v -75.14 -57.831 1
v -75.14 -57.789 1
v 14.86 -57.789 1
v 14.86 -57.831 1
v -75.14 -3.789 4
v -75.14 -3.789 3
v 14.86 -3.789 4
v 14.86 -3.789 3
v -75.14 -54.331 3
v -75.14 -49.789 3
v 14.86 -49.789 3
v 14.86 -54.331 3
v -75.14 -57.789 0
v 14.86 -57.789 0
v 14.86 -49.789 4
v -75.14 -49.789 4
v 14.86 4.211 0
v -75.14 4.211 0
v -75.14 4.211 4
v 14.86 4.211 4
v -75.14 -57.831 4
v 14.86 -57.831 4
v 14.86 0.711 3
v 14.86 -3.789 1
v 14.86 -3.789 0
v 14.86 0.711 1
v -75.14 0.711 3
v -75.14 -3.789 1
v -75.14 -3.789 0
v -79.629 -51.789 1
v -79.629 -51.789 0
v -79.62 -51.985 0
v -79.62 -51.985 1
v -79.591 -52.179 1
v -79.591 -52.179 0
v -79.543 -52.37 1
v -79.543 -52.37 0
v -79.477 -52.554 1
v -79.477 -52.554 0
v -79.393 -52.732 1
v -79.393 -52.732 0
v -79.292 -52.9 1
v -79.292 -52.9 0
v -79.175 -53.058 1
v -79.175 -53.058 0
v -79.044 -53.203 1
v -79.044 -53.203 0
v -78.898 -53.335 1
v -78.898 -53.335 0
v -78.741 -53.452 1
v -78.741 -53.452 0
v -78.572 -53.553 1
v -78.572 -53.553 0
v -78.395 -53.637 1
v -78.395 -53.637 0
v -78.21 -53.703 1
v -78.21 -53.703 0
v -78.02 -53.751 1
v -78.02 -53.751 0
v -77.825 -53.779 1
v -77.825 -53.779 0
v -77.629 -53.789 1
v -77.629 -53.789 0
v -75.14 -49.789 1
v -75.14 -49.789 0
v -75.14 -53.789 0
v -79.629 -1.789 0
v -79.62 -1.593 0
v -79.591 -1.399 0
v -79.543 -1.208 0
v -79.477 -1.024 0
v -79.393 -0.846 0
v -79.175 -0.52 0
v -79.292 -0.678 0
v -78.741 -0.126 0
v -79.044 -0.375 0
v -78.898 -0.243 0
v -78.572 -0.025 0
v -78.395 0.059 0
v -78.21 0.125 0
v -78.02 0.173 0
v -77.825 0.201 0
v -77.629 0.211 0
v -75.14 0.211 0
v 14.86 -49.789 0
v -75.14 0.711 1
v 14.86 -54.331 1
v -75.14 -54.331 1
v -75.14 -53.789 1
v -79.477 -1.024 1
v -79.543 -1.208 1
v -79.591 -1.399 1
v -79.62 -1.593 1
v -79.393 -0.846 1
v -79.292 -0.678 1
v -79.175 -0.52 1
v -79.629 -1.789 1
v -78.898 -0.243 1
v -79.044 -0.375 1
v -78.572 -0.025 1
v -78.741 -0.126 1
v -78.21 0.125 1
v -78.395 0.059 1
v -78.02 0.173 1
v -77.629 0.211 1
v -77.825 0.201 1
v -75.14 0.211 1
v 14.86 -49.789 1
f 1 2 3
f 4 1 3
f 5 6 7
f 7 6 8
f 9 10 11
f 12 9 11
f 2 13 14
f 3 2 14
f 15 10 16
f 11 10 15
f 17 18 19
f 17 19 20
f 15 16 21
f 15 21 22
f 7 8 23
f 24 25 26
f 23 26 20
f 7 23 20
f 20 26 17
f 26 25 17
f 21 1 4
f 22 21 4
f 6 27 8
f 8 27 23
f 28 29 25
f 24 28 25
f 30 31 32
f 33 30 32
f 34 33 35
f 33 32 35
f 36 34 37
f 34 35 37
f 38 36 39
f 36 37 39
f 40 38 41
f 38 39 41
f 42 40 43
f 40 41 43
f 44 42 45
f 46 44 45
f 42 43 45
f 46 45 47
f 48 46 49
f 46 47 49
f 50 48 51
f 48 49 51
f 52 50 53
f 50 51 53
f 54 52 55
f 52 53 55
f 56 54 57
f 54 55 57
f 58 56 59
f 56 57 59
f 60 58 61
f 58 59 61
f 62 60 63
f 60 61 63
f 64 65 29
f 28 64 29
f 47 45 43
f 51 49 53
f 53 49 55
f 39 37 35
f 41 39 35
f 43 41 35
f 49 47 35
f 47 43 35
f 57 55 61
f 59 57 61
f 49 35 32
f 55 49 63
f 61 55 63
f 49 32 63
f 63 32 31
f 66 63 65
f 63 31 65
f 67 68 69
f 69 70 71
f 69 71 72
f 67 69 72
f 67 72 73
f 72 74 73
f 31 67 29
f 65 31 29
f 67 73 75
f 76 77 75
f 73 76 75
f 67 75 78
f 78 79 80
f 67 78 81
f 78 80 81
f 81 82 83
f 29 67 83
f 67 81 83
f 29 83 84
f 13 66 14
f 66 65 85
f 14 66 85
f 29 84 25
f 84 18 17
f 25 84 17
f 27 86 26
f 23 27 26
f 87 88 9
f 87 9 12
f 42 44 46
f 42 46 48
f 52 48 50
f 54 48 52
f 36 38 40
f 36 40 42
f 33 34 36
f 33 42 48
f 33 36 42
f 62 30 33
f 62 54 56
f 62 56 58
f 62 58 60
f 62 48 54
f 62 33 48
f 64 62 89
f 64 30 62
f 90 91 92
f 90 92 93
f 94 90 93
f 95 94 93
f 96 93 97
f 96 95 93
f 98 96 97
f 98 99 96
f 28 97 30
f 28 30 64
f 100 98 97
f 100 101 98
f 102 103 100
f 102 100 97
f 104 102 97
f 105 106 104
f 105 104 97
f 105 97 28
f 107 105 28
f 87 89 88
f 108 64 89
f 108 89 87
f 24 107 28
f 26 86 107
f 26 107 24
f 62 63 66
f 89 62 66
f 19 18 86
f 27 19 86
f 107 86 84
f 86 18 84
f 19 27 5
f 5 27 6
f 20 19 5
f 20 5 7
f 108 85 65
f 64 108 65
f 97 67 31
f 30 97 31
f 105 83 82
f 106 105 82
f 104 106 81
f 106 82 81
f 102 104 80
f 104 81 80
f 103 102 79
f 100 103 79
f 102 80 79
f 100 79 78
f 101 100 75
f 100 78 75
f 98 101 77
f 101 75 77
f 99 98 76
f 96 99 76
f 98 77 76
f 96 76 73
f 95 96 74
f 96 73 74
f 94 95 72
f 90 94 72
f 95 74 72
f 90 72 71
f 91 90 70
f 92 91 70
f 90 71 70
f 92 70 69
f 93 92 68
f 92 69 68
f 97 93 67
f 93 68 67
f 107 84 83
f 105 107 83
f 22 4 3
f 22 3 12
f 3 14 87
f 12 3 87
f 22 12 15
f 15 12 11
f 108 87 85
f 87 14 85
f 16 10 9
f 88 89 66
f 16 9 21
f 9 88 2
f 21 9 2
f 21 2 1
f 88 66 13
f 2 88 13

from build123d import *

# Parameters (mm, degrees)
F2_DEPTH = 1
F3_W     = 90
F3_H     = 3.5
F3_H_2   = 0.0419686139
F3_H_3   = 3.4580313861
F4_DEPTH = 2
F5_W     = 90
F5_H     = 3.5
F5_H_2   = 4.5
F5_H_3   = 8.0419686139
F6_DEPTH = 1


# Not quite as in the source:
# - a feature names something its author has since deleted; it is built from what else it names


with BuildPart() as f2:
    # F1 (on face) → F2 (new body)
    with BuildSketch(Plane.XY):
        with BuildLine():
            Line((14.8598281033, 4.21106866), (-75.1401718967, 4.21106866))
            Line((-75.1401718967, 4.21106866), (-75.1401718967, 0.21106866))
            Line((-75.1401718967, 0.21106866), (4.3706398308, 0.21106866))
            ThreePointArc((4.3706398308, 0.21106866), (5.7848533932, -0.3747177776), (6.3706398308, -1.78893134))
            Line((6.3706398308, -1.78893134), (6.3706398308, -3.78893134))
            Line((6.3706398308, -3.78893134), (14.8598281033, -3.78893134))
            Line((14.8598281033, -3.78893134), (14.8598281033, 4.21106866))
        make_face()
        with BuildLine():
            Line((14.8598281033, -49.78893134), (6.3706398308, -49.78893134))
            Line((6.3706398308, -49.78893134), (6.3706398308, -51.78893134))
            ThreePointArc((6.3706398308, -51.78893134), (5.7848533932, -53.2031449024), (4.3706398308, -53.78893134))
            Line((4.3706398308, -53.78893134), (-75.1401718967, -53.78893134))
            Line((-75.1401718967, -53.78893134), (-75.1401718967, -57.78893134))
            Line((-75.1401718967, -57.78893134), (14.8598281033, -57.78893134))
            Line((14.8598281033, -57.78893134), (14.8598281033, -49.78893134))
        make_face()
        with BuildLine():
            Line((-75.1401718967, -3.78893134), (-75.1401718967, 0.21106866))
            Line((-75.1401718967, 0.21106866), (-77.6293601692, 0.21106866))
            ThreePointArc((-77.6293601692, 0.21106866), (-79.0435737315, -0.3747177776), (-79.6293601692, -1.78893134))
            Line((-79.6293601692, -1.78893134), (-79.6293601692, -51.78893134))
            ThreePointArc((-79.6293601692, -51.78893134), (-79.0435737315, -53.2031449024), (-77.6293601692, -53.78893134))
            Line((-77.6293601692, -53.78893134), (-75.1401718967, -53.78893134))
            Line((-75.1401718967, -53.78893134), (-75.1401718967, -49.78893134))
            Line((-75.1401718967, -49.78893134), (-75.1401718967, -3.78893134))
        make_face()
        with BuildLine():
            Line((-68.8141618371, -49.78893134), (-75.1401718967, -49.78893134))
            Line((-75.1401718967, -49.78893134), (-75.1401718967, -53.78893134))
            Line((-75.1401718967, -53.78893134), (4.3706398308, -53.78893134))
            ThreePointArc((4.3706398308, -53.78893134), (5.7848533932, -53.2031449024), (6.3706398308, -51.78893134))
            Line((6.3706398308, -51.78893134), (6.3706398308, -49.78893134))
            Line((6.3706398308, -49.78893134), (6.1858381629, -49.78893134))
            Line((6.1858381629, -49.78893134), (0.4592296318, -49.78893134))
            Line((0.4592296318, -49.78893134), (-68.8141618371, -49.78893134))
        make_face()
        with BuildLine():
            Line((4.3706398308, 0.21106866), (-75.1401718967, 0.21106866))
            Line((-75.1401718967, 0.21106866), (-75.1401718967, -3.78893134))
            Line((-75.1401718967, -3.78893134), (-68.8141618371, -3.78893134))
            Line((-68.8141618371, -3.78893134), (6.1858381629, -3.78893134))
            Line((6.1858381629, -3.78893134), (6.3706398308, -3.78893134))
            Line((6.3706398308, -3.78893134), (6.3706398308, -1.78893134))
            ThreePointArc((6.3706398308, -1.78893134), (5.7848533932, -0.3747177776), (4.3706398308, 0.21106866))
        make_face()
    extrude(amount=F2_DEPTH)

    # F3 (on face) → F4 (join)
    with BuildSketch(Plane.XY.offset(1)):
        with Locations((-30.1401718967, 2.46106866)):
            Rectangle(F3_W, F3_H)
        with Locations((-30.1401718967, -57.8099156469)):
            Rectangle(F3_W, F3_H_2)
        with Locations((-30.1401718967, -56.0599156469)):
            Rectangle(F3_W, F3_H_3)
    extrude(amount=F4_DEPTH)

    # F5 (on face) → F6 (join)
    with BuildSketch(Plane.XY.offset(3)):
        with Locations((-30.1401718967, 2.46106866)):
            Rectangle(F5_W, F5_H)
        with Locations((-30.1401718967, -1.53893134)):
            Rectangle(F5_W, F5_H_2)
        with Locations((-30.1401718967, -53.8099156469)):
            Rectangle(F5_W, F5_H_3)
    extrude(amount=F6_DEPTH)


solid = f2.part
